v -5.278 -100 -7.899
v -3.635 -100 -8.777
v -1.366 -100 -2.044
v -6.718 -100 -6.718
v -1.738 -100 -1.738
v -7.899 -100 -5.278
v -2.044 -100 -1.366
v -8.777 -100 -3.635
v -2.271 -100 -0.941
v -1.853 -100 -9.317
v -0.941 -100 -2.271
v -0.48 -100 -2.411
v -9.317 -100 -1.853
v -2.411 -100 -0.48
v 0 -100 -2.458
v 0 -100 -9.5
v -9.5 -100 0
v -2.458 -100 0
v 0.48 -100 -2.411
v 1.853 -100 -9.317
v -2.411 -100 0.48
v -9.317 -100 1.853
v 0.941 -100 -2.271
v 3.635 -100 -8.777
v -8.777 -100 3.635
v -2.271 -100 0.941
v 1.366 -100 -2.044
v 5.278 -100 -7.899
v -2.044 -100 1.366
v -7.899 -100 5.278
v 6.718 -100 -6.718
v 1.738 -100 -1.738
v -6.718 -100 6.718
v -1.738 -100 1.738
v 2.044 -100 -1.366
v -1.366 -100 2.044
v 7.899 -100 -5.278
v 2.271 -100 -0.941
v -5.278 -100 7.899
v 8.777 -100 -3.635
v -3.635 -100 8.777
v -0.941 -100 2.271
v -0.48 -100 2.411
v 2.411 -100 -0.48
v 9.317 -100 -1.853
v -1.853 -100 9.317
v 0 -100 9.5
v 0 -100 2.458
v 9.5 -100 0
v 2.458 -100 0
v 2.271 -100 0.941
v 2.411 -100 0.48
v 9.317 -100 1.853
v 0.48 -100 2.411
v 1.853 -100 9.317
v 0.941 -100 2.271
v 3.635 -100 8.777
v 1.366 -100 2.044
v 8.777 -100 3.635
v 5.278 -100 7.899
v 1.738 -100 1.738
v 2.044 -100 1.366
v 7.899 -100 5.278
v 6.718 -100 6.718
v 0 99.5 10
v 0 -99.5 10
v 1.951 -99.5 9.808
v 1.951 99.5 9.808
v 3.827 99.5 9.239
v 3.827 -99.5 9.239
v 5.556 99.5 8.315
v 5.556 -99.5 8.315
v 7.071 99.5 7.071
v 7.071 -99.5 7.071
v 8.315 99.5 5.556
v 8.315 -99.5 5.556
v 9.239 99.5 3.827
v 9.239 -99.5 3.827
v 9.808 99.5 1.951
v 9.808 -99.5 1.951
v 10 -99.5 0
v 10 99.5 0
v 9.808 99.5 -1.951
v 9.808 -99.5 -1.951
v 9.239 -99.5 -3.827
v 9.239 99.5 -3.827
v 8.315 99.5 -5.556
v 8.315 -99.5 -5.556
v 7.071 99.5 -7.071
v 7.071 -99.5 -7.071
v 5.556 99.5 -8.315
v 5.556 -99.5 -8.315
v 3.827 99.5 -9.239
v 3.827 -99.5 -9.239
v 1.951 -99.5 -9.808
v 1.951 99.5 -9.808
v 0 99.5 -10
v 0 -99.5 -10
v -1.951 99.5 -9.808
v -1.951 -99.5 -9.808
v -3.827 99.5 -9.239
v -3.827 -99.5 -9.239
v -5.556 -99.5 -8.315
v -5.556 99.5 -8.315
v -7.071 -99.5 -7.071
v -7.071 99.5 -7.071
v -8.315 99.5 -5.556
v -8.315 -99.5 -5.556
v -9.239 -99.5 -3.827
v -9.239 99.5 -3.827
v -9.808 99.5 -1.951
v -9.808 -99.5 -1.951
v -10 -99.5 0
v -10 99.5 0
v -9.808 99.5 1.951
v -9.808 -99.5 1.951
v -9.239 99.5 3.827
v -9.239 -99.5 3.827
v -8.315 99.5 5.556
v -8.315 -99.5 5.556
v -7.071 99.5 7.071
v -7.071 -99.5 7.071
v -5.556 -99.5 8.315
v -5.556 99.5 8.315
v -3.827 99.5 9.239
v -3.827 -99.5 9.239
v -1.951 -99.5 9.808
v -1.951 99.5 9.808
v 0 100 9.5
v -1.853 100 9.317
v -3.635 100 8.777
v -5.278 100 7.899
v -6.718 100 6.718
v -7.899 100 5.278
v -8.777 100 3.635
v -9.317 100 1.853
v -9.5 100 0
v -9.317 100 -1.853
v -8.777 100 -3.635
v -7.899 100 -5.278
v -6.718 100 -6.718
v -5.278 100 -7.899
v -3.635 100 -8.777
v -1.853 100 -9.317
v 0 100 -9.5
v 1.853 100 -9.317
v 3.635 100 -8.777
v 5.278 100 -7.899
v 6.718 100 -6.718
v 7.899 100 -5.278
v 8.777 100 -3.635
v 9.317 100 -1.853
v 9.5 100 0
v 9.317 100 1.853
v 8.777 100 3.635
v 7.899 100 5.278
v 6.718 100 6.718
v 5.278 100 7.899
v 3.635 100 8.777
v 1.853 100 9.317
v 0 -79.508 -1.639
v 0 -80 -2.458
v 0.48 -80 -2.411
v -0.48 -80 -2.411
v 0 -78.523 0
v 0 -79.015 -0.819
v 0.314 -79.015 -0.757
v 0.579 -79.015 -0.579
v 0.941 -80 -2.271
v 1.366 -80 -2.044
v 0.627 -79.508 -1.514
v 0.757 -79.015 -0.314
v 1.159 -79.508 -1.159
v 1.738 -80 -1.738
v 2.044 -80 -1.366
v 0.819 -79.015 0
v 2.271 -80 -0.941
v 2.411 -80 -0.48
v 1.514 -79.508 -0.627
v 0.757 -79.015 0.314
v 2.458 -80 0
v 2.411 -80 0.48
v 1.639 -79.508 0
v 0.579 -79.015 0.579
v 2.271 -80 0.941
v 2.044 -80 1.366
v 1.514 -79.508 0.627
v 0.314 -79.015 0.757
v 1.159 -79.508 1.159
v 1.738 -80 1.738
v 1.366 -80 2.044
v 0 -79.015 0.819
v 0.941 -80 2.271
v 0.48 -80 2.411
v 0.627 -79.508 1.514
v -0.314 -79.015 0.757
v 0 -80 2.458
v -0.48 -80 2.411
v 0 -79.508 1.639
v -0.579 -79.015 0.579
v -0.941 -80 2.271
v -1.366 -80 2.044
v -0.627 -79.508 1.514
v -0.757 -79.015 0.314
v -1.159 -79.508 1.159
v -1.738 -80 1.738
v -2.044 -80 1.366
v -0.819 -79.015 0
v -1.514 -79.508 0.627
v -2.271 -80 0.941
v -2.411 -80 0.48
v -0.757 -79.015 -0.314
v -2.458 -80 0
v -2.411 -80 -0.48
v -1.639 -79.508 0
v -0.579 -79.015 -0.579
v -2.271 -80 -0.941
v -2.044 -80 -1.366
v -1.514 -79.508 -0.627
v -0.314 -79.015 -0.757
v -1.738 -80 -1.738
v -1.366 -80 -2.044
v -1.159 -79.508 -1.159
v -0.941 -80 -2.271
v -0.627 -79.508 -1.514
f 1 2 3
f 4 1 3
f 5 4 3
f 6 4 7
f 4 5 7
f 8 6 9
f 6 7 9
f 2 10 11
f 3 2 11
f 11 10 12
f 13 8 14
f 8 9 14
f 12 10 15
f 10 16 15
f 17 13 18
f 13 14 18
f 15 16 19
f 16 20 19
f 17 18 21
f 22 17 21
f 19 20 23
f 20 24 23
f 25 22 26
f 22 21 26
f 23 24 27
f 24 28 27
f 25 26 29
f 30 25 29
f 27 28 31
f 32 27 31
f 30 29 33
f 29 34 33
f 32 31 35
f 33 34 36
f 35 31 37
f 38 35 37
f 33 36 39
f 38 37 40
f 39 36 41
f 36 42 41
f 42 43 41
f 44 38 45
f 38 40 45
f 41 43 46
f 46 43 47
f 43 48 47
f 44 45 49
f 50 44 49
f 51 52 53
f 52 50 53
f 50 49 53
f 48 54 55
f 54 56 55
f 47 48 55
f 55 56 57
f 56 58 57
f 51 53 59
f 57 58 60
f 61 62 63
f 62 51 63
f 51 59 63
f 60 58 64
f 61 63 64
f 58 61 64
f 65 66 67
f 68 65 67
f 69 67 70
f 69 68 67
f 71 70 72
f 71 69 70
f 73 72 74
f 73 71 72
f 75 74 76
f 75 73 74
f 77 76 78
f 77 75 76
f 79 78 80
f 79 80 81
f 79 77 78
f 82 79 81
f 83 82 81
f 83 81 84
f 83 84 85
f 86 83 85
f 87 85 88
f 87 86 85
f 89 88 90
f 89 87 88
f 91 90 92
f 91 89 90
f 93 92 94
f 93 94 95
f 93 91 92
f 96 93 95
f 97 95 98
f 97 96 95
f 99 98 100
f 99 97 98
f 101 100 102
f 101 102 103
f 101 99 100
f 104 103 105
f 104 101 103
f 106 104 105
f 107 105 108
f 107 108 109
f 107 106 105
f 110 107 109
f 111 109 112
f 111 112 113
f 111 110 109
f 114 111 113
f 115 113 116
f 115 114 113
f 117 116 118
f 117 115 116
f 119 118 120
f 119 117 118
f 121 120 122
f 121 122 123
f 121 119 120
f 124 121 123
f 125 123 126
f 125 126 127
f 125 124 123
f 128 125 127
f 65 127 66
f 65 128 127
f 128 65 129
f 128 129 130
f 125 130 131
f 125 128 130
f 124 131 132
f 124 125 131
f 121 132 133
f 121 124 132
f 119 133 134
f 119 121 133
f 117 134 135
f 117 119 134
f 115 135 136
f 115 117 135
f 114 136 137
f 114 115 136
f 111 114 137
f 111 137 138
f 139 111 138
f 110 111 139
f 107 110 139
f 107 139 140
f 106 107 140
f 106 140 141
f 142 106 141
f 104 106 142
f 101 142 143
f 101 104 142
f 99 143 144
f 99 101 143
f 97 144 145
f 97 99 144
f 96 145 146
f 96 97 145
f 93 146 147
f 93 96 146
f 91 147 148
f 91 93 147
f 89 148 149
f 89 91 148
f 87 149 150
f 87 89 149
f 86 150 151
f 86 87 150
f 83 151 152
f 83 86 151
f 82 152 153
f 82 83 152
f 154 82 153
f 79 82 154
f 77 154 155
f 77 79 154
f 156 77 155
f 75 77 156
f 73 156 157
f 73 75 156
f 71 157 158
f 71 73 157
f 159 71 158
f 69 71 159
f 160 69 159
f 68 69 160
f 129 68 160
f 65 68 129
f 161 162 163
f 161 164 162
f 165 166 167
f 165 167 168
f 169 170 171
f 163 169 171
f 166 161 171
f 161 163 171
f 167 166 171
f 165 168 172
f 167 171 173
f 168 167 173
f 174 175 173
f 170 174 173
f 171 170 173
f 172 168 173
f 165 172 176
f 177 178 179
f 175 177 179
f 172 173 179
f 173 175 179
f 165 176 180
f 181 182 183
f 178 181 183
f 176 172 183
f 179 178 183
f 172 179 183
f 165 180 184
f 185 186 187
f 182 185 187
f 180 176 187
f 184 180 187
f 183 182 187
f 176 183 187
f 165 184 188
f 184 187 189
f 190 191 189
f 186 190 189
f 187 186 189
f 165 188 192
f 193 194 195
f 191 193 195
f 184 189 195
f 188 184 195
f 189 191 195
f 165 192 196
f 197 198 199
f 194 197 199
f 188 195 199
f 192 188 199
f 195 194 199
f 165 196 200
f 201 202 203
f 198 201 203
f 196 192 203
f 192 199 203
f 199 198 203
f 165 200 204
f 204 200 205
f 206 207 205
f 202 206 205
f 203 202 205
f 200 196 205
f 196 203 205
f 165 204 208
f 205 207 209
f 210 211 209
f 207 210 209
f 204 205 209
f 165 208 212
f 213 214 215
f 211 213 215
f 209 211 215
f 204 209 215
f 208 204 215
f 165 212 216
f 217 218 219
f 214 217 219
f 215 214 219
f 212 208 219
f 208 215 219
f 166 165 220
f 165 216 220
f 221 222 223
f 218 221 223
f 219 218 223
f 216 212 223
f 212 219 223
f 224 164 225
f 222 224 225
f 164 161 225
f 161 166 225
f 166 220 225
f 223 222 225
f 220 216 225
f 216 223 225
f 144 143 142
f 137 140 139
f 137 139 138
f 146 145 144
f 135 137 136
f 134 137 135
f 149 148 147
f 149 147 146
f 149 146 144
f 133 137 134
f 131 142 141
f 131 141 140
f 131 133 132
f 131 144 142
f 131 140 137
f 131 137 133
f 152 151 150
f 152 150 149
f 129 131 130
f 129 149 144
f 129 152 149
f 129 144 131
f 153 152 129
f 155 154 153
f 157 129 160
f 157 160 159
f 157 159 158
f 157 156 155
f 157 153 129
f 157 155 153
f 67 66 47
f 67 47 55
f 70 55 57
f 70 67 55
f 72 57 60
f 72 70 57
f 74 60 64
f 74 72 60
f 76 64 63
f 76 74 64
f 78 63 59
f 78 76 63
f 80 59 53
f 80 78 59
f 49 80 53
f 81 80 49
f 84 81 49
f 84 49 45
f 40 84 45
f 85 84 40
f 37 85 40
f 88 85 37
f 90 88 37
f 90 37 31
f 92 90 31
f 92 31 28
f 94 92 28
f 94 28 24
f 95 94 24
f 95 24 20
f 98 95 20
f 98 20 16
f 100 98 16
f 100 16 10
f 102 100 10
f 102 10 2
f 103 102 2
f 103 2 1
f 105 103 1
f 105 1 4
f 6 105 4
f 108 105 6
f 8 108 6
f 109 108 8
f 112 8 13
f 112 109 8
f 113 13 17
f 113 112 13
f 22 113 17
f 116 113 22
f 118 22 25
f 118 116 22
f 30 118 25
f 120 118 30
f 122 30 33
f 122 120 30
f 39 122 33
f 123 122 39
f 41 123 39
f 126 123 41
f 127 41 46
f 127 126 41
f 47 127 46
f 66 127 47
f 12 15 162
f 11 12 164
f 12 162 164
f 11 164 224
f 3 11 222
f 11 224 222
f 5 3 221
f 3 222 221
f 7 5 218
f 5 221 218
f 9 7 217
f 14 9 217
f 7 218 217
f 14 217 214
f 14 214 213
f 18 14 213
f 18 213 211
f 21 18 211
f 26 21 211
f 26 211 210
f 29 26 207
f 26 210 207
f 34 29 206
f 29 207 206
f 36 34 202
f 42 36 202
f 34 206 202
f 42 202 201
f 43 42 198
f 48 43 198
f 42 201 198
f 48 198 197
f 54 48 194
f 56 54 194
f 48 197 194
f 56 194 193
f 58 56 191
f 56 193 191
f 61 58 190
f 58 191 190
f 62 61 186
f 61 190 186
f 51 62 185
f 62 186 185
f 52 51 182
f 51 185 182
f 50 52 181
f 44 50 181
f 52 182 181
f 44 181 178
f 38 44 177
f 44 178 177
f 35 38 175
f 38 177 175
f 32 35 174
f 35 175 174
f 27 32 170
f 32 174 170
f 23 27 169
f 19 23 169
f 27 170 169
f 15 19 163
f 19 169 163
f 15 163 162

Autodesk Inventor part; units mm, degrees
ref_plane "YZ Plane" through (0, 0, 0) normal (1, 0, 0) x (0, 1, 0)
ref_plane "XZ Plane" through (0, 0, 0) normal (0, 1, 0) x (-1, 0, 0)
ref_plane "XY Plane" through (0, 0, 0) normal (0, 0, 1) x (1, 0, 0)
sketch "Sketch1" plane through (0, 0, 0) normal (1, 0, 0) x (0, 1, 0)
  line L0 (-140, 0) -> (140, 0) construction
  line L1 (0, -2) -> (0, 12) construction
  line L2 (-100, 10) -> (100, 10)
  line L3 (100, 10) -> (100, 0)
  line L4 (100, 0) -> (-100, 0)
  line L5 (-100, 0) -> (-100, 10)
  point P0 (0, 0)
  dimension "d0" = 20
  dimension "d1" = 200
revolve "Revolution1" add sketch "Sketch1" angle 360 about axis through (0, -10, 0) along (0, 1, 0)
sketch "Sketch2" plane through (0, -100, 0) normal (0, -1, 0) x (1, 0, 0)
  circle A0 centre (0, 0) radius 10 projected
hole "Hole1" at (0, -100, 0) direction (0, 1, 0) diameter 4.917 depth 20 tip angle 118 thread size "M6x1" class "6H" standard "ISO Metric profile"
chamfer "Chamfer1" distance 0.5 angle 45 2 edges at (0, -100, -10) (0, 100, -10)
properties part number "DLT-01-236B" material "Aço SAE 1045"
